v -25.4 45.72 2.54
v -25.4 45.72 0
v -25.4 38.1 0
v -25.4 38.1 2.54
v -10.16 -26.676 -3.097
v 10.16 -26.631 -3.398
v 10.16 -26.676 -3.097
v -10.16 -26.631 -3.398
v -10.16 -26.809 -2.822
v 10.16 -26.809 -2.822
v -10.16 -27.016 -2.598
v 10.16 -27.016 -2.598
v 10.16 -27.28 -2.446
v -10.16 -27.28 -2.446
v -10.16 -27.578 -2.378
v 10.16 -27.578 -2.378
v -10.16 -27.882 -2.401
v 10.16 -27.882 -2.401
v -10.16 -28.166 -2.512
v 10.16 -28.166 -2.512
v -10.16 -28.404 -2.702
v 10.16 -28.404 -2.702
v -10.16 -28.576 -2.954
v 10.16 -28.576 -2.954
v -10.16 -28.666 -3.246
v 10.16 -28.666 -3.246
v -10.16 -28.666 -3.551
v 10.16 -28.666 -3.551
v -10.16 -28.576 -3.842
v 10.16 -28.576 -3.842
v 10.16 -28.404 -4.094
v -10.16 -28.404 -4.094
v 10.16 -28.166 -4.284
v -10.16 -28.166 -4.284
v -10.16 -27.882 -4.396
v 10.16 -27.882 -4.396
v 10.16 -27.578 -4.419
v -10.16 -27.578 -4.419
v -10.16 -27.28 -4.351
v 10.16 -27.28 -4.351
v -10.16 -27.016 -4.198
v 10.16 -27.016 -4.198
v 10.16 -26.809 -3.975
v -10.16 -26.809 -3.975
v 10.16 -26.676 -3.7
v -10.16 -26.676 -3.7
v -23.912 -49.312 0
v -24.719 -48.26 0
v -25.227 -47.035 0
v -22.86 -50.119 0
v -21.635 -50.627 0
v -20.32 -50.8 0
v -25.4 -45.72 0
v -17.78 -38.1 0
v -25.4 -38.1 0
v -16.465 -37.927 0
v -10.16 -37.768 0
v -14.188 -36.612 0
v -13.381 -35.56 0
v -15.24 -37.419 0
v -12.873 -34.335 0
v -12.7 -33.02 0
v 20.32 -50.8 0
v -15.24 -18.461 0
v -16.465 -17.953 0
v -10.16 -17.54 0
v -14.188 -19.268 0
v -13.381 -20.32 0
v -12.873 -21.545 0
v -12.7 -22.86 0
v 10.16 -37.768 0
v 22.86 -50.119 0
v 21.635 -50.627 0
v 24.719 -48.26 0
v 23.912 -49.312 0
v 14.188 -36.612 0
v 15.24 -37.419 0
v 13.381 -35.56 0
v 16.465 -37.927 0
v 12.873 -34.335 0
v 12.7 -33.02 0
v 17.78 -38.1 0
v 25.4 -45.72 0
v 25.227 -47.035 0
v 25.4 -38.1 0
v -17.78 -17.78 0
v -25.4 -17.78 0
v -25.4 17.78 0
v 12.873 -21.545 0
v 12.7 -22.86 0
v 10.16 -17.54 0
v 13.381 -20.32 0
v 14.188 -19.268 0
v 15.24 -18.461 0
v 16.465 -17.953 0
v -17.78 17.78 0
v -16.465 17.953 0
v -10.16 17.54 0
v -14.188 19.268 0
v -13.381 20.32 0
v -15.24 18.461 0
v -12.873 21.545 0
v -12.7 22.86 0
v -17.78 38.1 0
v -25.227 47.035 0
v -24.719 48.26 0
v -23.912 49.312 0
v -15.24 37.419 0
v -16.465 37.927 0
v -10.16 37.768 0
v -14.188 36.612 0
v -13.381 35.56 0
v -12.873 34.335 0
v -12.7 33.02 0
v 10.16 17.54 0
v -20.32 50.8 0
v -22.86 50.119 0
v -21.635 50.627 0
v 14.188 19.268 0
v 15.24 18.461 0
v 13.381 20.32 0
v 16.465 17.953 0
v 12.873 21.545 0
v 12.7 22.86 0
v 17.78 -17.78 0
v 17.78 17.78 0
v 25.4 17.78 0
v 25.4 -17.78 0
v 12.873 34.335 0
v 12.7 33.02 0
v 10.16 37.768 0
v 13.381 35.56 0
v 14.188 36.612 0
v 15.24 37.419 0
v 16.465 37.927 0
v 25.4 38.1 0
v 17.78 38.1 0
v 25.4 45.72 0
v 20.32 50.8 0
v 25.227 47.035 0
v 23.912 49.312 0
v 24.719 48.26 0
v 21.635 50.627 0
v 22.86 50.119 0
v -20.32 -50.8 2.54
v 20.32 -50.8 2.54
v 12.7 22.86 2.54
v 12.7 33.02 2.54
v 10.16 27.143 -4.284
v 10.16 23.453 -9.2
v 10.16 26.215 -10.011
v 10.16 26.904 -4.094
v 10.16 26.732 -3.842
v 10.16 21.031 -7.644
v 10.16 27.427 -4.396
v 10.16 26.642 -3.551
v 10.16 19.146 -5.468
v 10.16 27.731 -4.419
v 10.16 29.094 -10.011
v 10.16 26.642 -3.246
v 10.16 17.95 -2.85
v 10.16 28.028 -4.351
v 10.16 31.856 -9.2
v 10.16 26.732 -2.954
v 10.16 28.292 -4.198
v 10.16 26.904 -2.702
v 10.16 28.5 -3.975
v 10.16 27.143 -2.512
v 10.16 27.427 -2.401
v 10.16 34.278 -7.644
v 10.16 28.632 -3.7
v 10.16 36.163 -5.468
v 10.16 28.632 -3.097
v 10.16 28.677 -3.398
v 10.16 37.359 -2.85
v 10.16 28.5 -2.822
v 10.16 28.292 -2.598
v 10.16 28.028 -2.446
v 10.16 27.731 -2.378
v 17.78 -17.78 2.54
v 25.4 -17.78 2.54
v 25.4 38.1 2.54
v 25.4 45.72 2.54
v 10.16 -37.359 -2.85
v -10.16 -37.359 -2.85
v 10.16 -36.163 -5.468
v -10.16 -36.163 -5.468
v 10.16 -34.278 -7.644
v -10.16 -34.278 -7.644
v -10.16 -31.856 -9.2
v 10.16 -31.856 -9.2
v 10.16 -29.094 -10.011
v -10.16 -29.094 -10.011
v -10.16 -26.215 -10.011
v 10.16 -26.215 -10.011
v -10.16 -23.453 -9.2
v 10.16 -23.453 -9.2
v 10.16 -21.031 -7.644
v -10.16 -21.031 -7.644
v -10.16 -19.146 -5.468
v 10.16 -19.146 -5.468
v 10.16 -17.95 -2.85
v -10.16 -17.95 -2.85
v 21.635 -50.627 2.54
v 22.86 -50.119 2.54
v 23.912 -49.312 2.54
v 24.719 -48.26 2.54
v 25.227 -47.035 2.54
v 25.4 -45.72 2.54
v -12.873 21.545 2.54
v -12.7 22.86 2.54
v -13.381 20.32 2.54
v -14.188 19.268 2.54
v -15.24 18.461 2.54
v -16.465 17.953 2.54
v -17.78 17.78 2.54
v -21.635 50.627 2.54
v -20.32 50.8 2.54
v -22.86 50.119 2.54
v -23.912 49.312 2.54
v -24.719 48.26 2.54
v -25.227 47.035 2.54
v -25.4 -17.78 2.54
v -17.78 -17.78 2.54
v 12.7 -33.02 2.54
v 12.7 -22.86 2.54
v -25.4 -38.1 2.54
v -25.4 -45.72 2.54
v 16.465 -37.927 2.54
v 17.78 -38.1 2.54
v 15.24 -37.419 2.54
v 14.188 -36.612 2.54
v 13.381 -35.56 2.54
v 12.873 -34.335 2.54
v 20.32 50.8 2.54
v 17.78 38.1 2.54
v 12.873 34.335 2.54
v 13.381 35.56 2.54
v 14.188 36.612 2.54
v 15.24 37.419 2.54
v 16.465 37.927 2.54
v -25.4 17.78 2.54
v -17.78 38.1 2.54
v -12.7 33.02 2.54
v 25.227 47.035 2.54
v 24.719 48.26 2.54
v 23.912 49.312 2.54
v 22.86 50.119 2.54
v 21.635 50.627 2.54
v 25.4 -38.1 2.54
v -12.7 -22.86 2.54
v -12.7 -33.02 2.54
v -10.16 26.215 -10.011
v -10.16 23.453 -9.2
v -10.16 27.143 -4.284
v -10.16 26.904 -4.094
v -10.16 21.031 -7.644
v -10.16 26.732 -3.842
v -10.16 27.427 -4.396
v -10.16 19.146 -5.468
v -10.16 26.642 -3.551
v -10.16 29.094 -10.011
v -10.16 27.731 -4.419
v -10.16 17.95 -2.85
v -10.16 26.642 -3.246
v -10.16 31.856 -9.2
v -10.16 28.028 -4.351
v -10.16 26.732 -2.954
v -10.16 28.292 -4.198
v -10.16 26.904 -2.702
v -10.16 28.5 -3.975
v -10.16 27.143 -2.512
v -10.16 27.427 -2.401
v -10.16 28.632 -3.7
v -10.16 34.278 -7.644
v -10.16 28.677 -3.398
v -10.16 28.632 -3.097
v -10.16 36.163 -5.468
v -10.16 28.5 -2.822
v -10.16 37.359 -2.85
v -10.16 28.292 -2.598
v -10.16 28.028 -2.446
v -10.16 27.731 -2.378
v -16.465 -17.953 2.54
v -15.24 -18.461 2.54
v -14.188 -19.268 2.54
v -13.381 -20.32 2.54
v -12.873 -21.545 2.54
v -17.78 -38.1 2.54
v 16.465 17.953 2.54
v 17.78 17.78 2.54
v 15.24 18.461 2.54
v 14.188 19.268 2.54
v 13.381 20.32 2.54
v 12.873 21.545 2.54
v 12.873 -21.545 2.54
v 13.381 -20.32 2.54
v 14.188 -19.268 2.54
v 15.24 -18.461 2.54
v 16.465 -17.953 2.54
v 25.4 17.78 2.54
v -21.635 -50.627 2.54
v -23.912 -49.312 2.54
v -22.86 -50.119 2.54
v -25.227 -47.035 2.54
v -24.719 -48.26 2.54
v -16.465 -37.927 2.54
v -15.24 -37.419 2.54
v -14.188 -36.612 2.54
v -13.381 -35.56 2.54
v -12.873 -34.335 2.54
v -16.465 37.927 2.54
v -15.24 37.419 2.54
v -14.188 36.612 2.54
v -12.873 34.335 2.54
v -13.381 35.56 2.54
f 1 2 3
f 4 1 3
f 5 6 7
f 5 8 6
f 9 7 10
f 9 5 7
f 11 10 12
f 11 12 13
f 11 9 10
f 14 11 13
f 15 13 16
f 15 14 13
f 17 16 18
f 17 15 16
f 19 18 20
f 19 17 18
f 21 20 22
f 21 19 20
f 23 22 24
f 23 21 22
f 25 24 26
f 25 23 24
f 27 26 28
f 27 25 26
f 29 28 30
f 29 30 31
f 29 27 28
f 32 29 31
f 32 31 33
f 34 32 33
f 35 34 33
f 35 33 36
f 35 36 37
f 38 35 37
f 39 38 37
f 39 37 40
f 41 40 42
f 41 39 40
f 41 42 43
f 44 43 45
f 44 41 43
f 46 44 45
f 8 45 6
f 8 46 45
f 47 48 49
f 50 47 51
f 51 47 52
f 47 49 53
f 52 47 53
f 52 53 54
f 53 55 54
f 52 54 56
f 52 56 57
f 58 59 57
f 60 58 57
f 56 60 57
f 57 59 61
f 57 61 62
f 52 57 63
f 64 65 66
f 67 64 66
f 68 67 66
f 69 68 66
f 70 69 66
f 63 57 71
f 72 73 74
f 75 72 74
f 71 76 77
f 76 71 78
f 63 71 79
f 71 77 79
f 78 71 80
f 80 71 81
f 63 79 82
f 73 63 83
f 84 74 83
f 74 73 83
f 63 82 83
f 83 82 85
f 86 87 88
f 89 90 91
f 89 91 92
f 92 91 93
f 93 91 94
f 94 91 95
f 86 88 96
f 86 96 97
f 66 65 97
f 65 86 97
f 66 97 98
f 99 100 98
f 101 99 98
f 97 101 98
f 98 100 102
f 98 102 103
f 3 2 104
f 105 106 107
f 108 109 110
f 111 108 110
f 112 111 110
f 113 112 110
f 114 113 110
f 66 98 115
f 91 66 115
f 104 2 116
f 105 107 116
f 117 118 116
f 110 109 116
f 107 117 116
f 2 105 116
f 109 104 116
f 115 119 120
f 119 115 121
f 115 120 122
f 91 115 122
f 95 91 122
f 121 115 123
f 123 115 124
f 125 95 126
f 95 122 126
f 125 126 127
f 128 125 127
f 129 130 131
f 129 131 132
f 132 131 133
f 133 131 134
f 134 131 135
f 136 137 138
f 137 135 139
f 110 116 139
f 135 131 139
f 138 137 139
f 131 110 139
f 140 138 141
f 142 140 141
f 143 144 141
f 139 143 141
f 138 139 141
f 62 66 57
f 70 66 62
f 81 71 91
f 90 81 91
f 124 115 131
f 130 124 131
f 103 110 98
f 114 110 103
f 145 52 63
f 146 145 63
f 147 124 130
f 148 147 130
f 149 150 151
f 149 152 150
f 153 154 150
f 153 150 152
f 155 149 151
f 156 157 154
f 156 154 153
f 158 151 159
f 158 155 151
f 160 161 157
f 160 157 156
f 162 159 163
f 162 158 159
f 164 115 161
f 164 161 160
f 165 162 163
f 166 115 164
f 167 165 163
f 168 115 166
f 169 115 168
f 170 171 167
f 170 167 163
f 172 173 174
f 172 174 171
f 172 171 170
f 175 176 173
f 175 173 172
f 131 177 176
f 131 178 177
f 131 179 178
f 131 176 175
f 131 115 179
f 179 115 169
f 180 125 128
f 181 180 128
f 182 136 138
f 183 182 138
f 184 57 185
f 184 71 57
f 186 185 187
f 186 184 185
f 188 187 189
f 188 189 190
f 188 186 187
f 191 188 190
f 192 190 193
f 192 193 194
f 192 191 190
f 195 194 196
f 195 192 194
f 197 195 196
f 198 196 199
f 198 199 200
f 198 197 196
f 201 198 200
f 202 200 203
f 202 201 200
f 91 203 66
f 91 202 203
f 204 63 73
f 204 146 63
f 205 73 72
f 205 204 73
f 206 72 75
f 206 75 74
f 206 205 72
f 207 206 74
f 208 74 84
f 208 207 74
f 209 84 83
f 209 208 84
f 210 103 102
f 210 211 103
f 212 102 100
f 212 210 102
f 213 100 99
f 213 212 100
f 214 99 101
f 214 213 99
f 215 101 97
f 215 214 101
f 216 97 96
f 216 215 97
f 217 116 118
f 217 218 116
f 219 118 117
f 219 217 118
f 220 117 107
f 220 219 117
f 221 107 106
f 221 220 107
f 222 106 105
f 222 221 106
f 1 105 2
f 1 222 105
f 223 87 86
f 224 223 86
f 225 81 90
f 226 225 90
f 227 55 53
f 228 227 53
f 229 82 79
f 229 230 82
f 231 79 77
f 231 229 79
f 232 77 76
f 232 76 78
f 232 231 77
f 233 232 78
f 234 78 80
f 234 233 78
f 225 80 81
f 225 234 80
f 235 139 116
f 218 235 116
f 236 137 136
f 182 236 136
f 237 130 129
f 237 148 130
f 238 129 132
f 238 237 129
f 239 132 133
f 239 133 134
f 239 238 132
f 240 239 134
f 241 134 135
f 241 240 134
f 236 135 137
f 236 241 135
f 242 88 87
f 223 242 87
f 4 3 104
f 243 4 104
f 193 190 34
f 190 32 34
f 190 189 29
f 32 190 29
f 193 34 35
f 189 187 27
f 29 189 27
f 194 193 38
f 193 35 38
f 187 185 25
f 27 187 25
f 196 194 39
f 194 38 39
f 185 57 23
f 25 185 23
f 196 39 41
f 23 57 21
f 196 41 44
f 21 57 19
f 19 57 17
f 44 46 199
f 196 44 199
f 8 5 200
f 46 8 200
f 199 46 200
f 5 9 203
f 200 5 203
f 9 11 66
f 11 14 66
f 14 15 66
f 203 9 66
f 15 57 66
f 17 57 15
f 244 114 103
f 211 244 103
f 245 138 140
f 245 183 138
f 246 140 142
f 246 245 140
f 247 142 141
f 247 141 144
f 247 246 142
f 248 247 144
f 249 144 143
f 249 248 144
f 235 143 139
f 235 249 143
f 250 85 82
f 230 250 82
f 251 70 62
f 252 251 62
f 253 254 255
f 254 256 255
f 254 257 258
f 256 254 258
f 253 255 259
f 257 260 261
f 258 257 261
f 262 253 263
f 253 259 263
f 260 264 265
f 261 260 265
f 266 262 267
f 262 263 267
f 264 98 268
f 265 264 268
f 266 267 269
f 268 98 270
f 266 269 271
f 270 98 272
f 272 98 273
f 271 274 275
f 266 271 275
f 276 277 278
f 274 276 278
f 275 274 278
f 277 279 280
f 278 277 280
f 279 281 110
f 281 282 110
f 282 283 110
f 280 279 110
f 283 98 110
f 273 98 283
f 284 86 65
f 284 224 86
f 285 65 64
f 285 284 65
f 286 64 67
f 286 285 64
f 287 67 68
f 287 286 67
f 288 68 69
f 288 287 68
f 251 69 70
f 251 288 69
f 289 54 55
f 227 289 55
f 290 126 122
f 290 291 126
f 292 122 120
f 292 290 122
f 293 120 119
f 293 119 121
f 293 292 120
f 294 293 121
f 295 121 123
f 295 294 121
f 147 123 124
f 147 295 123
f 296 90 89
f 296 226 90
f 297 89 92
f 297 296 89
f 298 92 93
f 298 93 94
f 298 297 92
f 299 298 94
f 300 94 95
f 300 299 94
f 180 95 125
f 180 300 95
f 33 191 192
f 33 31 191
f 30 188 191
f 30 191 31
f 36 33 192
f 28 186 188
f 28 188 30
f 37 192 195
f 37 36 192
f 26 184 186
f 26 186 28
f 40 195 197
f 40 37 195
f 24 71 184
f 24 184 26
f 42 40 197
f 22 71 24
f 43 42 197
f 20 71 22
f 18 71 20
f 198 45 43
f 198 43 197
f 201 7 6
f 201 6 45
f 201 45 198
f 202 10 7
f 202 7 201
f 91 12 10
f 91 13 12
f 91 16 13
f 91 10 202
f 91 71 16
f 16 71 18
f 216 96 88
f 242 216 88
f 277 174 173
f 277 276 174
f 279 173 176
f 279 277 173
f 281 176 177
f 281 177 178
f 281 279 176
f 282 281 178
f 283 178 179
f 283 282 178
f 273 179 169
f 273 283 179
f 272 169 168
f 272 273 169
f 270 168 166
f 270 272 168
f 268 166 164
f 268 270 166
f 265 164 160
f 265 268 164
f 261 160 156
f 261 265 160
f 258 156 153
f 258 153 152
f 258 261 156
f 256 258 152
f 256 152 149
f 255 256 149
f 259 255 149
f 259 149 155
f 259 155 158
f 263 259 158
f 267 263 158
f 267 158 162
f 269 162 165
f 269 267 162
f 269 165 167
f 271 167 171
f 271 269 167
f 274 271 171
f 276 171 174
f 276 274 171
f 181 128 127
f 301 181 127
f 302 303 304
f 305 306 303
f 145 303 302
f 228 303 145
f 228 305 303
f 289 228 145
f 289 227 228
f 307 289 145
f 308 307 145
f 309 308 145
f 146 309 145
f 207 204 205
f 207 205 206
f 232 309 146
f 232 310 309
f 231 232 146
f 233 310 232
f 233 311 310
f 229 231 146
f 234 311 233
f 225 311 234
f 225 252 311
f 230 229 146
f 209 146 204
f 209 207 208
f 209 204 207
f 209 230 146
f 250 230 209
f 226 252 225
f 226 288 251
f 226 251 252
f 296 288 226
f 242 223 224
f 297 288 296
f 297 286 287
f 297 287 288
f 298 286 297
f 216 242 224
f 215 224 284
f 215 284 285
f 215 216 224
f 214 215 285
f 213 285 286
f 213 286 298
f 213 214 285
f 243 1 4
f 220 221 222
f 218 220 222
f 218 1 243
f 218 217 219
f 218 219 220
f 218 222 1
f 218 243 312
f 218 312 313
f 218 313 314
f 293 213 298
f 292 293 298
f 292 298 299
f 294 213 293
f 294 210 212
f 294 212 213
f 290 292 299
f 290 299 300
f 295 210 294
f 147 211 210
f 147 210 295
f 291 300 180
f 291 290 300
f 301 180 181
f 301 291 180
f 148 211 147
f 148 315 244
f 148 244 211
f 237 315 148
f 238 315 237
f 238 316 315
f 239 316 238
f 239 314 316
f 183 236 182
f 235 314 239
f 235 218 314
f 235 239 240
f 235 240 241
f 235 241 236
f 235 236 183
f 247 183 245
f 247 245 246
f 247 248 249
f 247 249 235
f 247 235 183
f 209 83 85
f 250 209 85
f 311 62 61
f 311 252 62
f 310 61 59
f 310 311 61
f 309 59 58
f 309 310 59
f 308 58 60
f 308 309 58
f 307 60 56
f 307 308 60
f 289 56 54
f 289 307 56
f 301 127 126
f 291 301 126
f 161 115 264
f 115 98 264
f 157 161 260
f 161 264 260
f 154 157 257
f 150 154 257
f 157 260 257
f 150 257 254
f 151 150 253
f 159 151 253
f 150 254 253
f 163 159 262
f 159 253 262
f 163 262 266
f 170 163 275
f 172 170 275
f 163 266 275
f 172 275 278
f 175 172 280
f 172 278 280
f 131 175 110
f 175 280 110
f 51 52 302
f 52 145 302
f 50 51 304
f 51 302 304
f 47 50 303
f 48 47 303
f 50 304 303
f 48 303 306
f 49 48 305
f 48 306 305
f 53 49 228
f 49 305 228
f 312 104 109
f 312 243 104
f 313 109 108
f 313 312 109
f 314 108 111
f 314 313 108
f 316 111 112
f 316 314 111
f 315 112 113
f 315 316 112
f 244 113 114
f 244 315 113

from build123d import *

# Parameters (mm, degrees)
F1_DEPTH = 2.54
F2_R     = 5.08
F3_R     = 1.0232120847
F4_DEPTH = 10.16


with BuildPart() as f1:
    # F0 (on Top) → F1 (new body)
    with BuildSketch(Plane.XY):
        Polygon((-25.4, -50.8), (25.4, -50.8), (25.4, -38.1), (12.7, -38.1), (12.7, -17.78), (25.4, -17.78), (25.4, 17.78), (12.7, 17.78), (12.7, 38.1), (25.4, 38.1), (25.4, 50.8), (-25.4, 50.8), (-25.4, 38.1), (-12.7, 38.1), (-12.7, 17.78), (-25.4, 17.78), (-25.4, -17.78), (-12.7, -17.78), (-12.7, -38.1), (-25.4, -38.1), align=None)
    extrude(amount=F1_DEPTH)

    # F2
    f2_edges = [f1.edges().sort_by_distance(p)[0] for p in [
        (25.4, 50.8, 1.27),
        (-25.4, 50.8, 1.27),
        (25.4, -50.8, 1.27),
        (-25.4, -50.8, 1.27),
        (-12.7, -17.78, 1.27),
        (-12.7, -38.1, 1.27),
        (-12.7, 17.78, 1.27),
        (-12.7, 38.1, 1.27),
        (12.7, 38.1, 1.27),
        (12.7, 17.78, 1.27),
        (12.7, -17.78, 1.27),
        (12.7, -38.1, 1.27),
    ]]
    fillet(f2_edges, radius=F2_R)

    # F3 (on Right) → F4 (join, symmetric)
    with BuildSketch(Plane.YZ):
        with BuildLine():
            Line((37.7684151684, 0), (17.5400050426, 0))
            ThreePointArc((17.5400050426, 0), (27.6542101055, -10.1142050629), (37.7684151684, 0))
        make_face()
        with Locations((27.6542101055, -3.3981921151)):
            Circle(F3_R, mode=Mode.SUBTRACT)
        with BuildLine():
            ThreePointArc((-37.7684151684, 0), (-27.6542101055, -10.1142050629), (-17.5400050426, 0))
            Line((-17.5400050426, 0), (-37.7684151684, 0))
        make_face()
        with Locations((-27.6542101055, -3.3981921151)):
            Circle(F3_R, mode=Mode.SUBTRACT)
    extrude(amount=F4_DEPTH, both=True)


solid = f1.part
